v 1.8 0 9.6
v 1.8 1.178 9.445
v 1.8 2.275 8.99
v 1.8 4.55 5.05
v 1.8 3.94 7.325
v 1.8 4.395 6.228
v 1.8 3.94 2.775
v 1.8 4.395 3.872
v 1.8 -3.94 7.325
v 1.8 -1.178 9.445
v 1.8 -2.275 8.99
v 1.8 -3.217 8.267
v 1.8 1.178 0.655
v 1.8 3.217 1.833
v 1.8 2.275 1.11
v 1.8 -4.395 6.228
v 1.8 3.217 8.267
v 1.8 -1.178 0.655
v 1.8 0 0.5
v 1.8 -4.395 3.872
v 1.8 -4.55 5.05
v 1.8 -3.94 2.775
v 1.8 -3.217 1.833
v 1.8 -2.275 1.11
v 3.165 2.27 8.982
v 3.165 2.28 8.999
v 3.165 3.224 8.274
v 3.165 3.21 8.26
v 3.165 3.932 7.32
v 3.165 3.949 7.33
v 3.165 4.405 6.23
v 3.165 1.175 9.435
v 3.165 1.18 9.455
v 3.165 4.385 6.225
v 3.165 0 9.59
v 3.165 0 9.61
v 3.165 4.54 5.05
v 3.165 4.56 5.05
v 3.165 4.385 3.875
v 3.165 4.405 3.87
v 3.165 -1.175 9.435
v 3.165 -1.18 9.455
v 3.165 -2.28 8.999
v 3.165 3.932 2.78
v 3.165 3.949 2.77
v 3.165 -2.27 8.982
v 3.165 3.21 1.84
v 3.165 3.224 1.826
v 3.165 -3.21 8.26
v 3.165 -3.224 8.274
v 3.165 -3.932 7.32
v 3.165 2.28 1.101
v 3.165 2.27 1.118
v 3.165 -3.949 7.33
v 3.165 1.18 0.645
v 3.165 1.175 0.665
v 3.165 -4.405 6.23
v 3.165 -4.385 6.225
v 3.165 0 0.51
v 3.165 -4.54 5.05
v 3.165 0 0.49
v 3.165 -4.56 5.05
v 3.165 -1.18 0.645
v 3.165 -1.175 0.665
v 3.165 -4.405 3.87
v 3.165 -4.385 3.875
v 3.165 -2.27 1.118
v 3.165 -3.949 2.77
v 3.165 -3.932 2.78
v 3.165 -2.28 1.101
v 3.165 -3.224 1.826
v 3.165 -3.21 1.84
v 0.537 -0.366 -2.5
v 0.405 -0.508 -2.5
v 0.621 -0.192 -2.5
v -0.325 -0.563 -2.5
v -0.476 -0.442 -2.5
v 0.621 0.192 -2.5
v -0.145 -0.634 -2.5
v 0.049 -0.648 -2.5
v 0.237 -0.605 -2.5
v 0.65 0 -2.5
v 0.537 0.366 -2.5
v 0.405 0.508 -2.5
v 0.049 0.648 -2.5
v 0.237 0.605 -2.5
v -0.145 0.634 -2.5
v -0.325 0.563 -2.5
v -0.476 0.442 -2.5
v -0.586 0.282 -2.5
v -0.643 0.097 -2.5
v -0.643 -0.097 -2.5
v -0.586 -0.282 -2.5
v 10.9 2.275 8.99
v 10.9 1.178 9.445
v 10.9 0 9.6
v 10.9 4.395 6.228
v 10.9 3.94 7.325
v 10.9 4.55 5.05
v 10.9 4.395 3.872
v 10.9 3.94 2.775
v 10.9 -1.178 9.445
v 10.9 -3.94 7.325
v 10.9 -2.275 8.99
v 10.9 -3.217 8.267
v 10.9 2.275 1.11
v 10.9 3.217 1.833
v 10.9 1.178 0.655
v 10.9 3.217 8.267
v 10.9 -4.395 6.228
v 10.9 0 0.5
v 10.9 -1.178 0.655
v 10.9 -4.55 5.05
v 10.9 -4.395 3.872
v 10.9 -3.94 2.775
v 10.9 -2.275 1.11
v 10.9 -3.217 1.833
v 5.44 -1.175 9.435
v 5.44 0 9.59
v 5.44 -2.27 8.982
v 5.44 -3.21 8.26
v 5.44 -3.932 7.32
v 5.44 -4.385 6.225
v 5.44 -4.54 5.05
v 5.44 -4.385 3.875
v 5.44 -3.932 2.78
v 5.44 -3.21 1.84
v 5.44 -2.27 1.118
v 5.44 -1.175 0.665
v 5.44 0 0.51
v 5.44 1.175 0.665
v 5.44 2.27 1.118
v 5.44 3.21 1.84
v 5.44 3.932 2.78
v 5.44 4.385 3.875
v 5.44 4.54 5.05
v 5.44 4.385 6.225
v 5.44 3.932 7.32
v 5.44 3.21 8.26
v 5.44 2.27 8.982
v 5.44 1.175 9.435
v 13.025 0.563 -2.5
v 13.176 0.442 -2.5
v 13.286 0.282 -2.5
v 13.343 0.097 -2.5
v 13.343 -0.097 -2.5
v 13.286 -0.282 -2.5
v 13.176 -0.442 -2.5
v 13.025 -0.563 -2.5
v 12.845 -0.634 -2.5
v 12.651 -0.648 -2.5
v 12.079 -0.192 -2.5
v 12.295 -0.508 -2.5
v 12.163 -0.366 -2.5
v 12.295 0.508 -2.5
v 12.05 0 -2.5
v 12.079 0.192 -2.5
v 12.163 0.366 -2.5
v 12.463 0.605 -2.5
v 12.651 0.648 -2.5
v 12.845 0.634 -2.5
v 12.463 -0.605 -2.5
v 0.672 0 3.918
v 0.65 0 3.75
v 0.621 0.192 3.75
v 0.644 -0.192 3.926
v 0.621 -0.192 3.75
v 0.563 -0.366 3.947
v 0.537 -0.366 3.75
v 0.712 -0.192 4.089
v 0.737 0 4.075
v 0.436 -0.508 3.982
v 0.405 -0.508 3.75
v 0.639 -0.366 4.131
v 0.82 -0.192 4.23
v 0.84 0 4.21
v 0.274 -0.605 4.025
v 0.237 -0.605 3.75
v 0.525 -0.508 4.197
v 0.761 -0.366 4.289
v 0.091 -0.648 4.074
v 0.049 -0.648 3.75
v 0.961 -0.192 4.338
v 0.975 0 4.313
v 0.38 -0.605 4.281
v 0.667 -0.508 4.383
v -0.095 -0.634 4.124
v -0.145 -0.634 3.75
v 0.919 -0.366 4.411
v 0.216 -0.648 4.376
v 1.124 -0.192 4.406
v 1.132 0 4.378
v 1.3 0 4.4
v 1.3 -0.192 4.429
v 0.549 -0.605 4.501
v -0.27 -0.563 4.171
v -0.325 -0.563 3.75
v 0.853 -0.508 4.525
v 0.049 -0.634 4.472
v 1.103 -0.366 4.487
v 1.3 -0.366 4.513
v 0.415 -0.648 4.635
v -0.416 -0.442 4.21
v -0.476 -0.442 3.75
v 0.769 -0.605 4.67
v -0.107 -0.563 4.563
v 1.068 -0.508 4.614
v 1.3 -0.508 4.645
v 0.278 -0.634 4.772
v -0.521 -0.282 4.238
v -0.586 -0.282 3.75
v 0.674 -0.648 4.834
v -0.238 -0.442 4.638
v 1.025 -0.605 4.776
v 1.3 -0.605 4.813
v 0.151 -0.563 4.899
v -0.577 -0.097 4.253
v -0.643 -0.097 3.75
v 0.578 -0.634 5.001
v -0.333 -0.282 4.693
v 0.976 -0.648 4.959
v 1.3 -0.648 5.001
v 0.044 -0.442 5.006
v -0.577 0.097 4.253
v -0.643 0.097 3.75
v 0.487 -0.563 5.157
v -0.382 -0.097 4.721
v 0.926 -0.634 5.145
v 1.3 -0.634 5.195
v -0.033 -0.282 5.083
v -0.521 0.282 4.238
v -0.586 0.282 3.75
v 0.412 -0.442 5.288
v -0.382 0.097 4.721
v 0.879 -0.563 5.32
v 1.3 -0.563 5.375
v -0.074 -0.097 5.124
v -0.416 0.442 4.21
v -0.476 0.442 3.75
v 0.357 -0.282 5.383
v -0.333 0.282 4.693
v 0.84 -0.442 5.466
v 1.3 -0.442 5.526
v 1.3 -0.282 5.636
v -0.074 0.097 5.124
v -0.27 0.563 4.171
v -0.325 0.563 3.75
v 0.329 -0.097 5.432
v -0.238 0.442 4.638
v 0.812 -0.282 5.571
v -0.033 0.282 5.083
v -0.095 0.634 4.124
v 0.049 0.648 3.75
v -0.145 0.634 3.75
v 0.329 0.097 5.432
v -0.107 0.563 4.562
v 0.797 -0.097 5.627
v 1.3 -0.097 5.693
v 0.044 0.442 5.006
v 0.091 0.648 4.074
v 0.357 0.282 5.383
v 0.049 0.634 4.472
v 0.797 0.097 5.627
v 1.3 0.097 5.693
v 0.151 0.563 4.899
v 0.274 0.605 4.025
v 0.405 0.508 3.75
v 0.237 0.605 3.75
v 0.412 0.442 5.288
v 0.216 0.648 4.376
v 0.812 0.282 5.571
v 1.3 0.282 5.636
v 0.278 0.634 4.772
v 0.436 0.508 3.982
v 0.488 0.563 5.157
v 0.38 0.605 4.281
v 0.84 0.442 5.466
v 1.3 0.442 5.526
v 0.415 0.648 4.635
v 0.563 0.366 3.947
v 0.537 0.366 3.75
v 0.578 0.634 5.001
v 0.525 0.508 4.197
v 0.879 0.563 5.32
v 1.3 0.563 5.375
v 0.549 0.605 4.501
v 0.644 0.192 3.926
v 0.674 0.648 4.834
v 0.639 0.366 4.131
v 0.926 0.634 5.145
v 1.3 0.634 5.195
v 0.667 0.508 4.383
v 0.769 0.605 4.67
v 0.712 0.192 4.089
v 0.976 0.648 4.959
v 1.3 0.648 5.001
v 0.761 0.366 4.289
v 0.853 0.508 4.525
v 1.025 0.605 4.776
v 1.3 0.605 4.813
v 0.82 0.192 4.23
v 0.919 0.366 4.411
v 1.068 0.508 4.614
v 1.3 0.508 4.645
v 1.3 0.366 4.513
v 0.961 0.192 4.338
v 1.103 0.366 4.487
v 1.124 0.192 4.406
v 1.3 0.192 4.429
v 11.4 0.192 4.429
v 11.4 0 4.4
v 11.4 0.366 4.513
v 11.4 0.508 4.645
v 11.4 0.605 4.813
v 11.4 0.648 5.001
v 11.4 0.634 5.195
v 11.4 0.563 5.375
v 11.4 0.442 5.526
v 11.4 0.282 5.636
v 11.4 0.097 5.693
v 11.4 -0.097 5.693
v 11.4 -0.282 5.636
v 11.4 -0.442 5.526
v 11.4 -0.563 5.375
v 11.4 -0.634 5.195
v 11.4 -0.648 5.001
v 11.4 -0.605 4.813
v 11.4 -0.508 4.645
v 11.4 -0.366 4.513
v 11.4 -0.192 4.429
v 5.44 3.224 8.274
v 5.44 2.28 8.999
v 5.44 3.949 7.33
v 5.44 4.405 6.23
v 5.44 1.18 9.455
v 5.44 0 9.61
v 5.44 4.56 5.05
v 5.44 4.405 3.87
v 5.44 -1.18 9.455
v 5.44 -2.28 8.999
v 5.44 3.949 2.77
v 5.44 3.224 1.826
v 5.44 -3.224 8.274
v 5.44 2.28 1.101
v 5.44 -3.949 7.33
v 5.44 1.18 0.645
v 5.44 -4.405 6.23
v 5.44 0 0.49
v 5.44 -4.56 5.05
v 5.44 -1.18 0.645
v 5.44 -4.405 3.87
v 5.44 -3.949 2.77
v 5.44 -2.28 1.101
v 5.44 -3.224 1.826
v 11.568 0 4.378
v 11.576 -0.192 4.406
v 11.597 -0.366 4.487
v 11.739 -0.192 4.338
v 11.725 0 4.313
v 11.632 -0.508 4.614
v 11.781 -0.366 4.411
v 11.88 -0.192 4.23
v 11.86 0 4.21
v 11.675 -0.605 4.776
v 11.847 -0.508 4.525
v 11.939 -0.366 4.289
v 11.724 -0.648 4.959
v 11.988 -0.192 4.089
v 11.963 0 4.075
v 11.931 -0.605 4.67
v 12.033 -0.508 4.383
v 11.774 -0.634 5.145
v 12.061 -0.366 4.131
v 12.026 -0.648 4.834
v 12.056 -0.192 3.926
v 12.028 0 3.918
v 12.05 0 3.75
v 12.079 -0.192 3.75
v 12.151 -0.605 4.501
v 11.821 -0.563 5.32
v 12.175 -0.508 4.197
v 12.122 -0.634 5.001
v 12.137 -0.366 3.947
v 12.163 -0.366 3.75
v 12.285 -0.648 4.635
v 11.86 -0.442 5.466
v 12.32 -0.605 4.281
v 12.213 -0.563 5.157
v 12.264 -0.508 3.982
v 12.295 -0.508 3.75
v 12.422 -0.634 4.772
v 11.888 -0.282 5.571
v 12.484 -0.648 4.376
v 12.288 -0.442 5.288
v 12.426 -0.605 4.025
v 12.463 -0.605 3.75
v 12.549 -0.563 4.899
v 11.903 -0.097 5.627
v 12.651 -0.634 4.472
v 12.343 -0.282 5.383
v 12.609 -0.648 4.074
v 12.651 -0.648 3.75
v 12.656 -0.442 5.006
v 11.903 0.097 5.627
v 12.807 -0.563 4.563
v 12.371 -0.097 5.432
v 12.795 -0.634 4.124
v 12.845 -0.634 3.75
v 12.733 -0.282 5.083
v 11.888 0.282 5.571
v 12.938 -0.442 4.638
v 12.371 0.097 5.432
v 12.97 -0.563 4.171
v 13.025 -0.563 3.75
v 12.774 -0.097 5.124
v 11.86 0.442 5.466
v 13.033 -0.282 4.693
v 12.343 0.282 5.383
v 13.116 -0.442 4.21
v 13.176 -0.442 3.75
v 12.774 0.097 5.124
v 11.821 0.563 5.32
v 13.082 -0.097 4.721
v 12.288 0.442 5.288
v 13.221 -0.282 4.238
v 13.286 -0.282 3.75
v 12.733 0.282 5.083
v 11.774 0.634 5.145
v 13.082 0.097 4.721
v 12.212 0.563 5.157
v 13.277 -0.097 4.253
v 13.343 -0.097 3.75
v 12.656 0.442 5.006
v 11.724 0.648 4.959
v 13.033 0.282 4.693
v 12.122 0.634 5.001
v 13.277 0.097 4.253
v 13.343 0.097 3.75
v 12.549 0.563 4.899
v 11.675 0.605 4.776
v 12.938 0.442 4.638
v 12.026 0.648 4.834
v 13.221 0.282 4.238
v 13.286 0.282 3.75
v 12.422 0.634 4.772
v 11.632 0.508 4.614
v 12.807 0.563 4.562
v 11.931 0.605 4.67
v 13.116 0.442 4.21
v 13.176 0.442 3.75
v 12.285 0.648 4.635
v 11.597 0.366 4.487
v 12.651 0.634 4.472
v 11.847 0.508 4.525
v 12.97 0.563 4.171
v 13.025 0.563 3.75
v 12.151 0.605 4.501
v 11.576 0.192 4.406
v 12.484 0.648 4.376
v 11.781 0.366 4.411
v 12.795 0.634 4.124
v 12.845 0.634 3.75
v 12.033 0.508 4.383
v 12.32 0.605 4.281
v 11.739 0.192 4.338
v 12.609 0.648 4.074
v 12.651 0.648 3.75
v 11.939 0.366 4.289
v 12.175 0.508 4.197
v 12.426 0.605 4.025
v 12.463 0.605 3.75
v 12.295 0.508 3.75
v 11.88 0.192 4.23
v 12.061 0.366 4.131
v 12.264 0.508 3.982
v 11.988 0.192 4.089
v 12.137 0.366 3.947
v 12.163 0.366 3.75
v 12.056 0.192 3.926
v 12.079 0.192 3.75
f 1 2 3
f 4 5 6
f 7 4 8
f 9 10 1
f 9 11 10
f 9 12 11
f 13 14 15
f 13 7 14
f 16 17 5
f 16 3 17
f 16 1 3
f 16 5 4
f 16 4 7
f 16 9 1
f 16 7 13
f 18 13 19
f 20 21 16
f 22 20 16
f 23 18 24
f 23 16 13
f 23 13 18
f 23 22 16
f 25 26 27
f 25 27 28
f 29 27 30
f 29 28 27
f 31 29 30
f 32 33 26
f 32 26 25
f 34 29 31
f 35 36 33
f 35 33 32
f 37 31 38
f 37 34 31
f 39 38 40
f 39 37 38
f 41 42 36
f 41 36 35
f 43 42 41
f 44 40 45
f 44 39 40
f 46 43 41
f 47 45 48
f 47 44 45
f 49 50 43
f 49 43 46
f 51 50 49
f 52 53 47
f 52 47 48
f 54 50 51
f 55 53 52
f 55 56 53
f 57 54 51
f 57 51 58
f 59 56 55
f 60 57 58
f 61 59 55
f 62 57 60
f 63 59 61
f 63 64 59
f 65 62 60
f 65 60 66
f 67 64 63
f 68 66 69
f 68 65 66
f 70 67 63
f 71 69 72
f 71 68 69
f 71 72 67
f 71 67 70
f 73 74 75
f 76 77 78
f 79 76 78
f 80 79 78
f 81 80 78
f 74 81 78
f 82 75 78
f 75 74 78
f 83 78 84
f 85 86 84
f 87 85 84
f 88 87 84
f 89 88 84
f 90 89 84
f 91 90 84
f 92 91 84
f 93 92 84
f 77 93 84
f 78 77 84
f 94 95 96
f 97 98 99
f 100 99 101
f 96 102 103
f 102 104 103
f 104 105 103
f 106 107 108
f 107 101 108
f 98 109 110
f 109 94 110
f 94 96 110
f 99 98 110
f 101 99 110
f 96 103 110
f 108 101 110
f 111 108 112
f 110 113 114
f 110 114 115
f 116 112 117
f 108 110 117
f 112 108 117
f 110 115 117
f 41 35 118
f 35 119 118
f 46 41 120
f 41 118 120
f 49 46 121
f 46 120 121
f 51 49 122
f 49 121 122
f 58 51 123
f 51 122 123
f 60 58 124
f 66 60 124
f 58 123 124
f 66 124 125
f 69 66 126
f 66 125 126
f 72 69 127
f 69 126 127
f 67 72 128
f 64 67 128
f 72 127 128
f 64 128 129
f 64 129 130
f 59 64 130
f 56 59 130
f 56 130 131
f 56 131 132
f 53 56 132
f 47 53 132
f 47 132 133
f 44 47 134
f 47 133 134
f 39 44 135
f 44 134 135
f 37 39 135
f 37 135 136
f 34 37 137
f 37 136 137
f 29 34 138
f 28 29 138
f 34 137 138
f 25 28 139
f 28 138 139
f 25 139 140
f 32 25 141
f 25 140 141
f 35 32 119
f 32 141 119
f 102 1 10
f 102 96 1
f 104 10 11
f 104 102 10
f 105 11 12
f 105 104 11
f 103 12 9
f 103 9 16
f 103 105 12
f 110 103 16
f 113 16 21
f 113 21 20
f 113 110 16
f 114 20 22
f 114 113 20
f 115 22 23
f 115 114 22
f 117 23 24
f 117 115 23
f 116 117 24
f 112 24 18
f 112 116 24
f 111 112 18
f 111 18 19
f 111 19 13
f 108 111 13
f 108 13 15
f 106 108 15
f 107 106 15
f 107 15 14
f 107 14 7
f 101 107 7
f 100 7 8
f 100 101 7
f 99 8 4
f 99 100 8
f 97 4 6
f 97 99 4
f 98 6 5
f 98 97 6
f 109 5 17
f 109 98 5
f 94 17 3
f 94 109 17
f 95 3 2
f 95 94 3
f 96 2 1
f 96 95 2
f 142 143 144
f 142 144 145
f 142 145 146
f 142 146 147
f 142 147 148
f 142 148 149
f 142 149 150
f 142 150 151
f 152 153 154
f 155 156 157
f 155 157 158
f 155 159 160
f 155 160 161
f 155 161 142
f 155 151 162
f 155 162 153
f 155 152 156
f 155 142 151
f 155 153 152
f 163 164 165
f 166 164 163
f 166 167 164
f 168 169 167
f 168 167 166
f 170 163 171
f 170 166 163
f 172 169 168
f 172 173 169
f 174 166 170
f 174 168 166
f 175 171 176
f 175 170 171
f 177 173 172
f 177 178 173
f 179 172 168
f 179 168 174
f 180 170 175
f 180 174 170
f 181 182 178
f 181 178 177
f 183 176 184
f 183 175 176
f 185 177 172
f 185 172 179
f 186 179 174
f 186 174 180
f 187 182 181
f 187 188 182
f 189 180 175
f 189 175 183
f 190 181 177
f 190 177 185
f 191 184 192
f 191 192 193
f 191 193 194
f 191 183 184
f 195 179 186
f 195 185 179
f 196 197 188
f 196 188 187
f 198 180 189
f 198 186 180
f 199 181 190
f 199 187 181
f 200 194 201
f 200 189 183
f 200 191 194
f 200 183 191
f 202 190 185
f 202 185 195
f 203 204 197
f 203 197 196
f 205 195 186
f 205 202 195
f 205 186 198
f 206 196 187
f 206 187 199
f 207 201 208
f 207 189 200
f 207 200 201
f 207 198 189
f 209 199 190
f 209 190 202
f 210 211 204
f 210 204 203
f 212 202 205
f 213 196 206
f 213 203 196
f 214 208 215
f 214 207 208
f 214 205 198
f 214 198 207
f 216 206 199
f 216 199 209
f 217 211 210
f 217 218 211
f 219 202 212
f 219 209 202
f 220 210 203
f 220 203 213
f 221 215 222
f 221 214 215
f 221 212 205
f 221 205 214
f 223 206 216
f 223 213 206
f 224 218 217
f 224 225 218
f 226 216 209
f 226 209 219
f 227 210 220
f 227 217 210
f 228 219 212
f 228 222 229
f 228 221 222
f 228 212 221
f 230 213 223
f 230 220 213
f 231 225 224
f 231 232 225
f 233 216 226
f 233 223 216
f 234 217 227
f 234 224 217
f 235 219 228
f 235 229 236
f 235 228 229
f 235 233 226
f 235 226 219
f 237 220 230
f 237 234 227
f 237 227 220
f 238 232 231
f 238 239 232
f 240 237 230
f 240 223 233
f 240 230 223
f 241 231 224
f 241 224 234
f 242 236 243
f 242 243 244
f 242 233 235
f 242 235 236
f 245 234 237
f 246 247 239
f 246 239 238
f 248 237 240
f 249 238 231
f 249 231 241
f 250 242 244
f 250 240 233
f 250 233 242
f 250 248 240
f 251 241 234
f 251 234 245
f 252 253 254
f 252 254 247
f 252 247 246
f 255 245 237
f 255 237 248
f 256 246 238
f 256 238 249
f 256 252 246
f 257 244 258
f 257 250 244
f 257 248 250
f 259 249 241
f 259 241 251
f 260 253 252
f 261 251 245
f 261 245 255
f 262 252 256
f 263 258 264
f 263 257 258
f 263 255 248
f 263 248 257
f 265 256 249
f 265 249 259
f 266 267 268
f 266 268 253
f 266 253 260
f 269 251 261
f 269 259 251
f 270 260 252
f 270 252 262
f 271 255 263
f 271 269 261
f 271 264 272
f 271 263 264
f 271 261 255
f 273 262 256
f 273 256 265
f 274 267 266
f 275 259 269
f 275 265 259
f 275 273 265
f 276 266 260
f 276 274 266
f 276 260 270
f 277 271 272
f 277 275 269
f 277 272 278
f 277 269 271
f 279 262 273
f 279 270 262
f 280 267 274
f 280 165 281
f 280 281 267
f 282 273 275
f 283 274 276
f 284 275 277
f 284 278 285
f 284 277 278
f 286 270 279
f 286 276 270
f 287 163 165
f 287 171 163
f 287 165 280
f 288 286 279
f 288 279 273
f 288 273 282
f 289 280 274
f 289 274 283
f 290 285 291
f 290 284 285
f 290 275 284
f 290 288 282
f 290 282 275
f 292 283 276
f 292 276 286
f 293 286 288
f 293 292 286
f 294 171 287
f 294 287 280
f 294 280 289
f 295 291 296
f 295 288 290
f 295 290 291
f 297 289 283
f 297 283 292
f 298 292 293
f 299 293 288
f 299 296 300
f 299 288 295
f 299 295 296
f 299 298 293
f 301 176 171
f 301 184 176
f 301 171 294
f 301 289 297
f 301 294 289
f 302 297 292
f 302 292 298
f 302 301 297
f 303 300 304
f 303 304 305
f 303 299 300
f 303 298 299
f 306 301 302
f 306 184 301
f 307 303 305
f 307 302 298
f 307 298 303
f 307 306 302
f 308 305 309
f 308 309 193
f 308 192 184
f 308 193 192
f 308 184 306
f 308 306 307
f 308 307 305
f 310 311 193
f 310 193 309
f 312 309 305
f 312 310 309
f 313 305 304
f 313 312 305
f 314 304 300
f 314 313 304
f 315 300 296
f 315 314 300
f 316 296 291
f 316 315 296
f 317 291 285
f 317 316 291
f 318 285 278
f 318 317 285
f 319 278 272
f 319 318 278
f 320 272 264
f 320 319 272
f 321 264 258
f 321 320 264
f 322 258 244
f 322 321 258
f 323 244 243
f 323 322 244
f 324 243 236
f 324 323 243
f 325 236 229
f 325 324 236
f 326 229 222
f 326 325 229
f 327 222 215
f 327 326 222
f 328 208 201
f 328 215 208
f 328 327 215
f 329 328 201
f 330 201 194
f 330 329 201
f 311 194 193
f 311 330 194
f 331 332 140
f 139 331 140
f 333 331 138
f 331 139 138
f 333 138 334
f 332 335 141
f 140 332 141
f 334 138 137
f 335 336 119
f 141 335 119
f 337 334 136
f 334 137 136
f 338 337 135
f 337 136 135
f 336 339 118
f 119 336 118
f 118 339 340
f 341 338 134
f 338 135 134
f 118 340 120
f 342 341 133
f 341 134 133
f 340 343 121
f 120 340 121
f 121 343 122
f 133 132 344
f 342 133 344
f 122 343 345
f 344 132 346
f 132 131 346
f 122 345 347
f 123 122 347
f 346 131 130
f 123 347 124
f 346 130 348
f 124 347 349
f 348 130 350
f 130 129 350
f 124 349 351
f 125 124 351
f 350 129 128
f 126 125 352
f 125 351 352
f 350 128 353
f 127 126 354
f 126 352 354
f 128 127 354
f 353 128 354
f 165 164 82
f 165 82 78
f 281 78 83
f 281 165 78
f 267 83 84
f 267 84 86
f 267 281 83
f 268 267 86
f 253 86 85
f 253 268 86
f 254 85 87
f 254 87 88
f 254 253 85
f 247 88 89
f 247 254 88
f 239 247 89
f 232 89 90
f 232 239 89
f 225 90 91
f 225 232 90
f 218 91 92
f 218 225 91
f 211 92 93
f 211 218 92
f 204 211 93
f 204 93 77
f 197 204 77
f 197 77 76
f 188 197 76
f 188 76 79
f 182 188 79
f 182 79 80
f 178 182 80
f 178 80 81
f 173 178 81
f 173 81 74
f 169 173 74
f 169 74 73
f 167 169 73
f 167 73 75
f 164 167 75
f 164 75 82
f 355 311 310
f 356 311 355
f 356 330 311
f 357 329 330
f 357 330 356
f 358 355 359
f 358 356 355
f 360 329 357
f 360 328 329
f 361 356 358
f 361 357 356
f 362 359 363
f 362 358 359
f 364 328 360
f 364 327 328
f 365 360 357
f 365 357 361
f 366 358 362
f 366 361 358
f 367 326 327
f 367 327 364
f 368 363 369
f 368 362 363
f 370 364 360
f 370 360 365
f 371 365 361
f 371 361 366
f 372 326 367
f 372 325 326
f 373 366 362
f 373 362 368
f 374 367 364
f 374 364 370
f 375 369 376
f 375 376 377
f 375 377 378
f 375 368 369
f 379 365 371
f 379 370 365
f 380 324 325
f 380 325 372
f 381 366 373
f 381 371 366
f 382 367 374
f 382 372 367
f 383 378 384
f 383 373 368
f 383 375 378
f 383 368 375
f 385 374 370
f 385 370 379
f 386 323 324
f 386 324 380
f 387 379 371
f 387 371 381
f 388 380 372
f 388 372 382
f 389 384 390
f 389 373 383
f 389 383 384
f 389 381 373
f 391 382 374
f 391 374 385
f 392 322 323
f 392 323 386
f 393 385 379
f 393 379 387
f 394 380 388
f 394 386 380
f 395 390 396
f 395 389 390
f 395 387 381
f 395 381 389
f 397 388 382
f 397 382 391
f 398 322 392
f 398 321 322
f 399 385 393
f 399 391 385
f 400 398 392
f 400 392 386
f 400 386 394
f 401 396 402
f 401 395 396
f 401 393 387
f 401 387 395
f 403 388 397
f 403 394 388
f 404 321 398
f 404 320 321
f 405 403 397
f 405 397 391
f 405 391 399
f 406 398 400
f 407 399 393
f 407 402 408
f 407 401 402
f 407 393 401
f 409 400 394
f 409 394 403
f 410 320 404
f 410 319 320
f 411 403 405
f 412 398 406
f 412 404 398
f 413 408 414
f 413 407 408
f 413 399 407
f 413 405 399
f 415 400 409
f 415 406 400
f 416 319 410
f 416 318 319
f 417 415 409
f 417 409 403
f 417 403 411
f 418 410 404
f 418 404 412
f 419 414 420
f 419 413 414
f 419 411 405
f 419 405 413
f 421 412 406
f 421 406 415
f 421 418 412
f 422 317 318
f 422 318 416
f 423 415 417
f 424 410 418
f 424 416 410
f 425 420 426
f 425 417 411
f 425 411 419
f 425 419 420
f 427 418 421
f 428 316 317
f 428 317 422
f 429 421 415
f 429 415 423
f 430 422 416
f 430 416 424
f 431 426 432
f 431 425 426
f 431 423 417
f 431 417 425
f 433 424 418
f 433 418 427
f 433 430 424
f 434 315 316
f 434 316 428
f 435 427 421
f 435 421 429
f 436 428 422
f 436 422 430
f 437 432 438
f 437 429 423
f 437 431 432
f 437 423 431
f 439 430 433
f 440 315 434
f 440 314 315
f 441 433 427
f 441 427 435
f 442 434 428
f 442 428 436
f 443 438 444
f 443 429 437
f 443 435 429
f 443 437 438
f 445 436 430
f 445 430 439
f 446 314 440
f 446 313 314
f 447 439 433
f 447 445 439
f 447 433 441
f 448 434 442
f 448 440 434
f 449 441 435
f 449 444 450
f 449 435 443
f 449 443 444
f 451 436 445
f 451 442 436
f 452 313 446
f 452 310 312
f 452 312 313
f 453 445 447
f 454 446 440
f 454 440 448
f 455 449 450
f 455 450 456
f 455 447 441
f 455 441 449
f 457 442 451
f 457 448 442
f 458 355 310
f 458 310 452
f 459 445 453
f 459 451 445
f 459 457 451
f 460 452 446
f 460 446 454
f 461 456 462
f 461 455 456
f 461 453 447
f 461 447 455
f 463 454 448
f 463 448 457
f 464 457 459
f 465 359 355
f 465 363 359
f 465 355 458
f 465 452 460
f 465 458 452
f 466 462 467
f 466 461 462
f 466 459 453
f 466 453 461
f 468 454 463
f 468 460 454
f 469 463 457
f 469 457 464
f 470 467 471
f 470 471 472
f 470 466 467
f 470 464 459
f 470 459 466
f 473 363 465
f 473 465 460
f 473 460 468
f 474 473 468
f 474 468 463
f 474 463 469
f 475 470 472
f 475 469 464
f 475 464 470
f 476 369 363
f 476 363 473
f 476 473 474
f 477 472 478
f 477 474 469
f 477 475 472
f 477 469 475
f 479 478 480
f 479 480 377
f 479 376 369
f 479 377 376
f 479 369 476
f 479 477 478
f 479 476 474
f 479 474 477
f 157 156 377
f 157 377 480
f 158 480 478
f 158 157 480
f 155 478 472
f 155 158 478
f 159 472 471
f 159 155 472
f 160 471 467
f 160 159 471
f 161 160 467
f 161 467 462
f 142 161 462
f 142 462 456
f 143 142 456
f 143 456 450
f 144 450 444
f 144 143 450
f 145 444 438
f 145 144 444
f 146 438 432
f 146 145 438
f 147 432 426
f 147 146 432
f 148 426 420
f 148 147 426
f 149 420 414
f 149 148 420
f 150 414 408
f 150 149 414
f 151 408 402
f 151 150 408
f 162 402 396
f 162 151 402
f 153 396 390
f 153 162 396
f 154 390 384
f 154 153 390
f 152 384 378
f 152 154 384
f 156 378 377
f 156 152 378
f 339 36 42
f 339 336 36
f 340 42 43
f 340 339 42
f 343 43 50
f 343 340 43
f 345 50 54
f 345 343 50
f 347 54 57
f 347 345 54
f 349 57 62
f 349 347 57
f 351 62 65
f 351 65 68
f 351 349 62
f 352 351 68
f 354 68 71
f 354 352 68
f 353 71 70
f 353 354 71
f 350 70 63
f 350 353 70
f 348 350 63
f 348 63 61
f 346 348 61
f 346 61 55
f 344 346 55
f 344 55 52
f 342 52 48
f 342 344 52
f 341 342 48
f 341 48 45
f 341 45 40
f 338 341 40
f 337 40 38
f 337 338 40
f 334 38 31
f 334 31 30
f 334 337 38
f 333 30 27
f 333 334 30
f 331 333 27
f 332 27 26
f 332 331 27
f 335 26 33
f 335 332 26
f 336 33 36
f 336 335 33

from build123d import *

# Parameters (mm, degrees)
SKETCH002_W = 9.1
SKETCH002_H = 4.55
SKETCH003_W = 2.275
SKETCH003_H = 0.02
SKETCH_R    = 0.65


with BuildPart() as revolution:
    # Sketch002 → Revolution (revolve)
    with BuildSketch(Plane.XZ):
        with Locations((6.35, 7.325)):
            Rectangle(SKETCH002_W, SKETCH002_H)
    revolve(axis=Axis((1.8, 0, 5.05), (1, 0, 0)))


with BuildPart() as revolution001:
    # Sketch003 → Revolution001 (revolve)
    with BuildSketch(Plane.XZ):
        with Locations((4.3025, 9.6)):
            Rectangle(SKETCH003_W, SKETCH003_H)
    revolve(axis=Axis((0, 0, 5.05), (1, 0, 0)))


with BuildPart() as sweep_body:
    # Sweep: sweep along a path in Sketch001
    with BuildLine(Plane.XZ) as sweep_path:
        Line((0, -2.5), (0, 3.75))
        ThreePointArc((0, 3.75), (0.380761, 4.669239), (1.3, 5.05))
        Line((1.3, 5.05), (11.4, 5.05))
        ThreePointArc((11.4, 5.05), (12.319239, 4.669239), (12.7, 3.75))
        Line((12.7, 3.75), (12.7, -2.5))
    # Sketch → Sweep (sweep)
    with BuildSketch(Plane.XY.offset(-2)):
        Circle(SKETCH_R)
    sweep(path=sweep_path.line)


solid = Compound([revolution.part, revolution001.part, sweep_body.part])
